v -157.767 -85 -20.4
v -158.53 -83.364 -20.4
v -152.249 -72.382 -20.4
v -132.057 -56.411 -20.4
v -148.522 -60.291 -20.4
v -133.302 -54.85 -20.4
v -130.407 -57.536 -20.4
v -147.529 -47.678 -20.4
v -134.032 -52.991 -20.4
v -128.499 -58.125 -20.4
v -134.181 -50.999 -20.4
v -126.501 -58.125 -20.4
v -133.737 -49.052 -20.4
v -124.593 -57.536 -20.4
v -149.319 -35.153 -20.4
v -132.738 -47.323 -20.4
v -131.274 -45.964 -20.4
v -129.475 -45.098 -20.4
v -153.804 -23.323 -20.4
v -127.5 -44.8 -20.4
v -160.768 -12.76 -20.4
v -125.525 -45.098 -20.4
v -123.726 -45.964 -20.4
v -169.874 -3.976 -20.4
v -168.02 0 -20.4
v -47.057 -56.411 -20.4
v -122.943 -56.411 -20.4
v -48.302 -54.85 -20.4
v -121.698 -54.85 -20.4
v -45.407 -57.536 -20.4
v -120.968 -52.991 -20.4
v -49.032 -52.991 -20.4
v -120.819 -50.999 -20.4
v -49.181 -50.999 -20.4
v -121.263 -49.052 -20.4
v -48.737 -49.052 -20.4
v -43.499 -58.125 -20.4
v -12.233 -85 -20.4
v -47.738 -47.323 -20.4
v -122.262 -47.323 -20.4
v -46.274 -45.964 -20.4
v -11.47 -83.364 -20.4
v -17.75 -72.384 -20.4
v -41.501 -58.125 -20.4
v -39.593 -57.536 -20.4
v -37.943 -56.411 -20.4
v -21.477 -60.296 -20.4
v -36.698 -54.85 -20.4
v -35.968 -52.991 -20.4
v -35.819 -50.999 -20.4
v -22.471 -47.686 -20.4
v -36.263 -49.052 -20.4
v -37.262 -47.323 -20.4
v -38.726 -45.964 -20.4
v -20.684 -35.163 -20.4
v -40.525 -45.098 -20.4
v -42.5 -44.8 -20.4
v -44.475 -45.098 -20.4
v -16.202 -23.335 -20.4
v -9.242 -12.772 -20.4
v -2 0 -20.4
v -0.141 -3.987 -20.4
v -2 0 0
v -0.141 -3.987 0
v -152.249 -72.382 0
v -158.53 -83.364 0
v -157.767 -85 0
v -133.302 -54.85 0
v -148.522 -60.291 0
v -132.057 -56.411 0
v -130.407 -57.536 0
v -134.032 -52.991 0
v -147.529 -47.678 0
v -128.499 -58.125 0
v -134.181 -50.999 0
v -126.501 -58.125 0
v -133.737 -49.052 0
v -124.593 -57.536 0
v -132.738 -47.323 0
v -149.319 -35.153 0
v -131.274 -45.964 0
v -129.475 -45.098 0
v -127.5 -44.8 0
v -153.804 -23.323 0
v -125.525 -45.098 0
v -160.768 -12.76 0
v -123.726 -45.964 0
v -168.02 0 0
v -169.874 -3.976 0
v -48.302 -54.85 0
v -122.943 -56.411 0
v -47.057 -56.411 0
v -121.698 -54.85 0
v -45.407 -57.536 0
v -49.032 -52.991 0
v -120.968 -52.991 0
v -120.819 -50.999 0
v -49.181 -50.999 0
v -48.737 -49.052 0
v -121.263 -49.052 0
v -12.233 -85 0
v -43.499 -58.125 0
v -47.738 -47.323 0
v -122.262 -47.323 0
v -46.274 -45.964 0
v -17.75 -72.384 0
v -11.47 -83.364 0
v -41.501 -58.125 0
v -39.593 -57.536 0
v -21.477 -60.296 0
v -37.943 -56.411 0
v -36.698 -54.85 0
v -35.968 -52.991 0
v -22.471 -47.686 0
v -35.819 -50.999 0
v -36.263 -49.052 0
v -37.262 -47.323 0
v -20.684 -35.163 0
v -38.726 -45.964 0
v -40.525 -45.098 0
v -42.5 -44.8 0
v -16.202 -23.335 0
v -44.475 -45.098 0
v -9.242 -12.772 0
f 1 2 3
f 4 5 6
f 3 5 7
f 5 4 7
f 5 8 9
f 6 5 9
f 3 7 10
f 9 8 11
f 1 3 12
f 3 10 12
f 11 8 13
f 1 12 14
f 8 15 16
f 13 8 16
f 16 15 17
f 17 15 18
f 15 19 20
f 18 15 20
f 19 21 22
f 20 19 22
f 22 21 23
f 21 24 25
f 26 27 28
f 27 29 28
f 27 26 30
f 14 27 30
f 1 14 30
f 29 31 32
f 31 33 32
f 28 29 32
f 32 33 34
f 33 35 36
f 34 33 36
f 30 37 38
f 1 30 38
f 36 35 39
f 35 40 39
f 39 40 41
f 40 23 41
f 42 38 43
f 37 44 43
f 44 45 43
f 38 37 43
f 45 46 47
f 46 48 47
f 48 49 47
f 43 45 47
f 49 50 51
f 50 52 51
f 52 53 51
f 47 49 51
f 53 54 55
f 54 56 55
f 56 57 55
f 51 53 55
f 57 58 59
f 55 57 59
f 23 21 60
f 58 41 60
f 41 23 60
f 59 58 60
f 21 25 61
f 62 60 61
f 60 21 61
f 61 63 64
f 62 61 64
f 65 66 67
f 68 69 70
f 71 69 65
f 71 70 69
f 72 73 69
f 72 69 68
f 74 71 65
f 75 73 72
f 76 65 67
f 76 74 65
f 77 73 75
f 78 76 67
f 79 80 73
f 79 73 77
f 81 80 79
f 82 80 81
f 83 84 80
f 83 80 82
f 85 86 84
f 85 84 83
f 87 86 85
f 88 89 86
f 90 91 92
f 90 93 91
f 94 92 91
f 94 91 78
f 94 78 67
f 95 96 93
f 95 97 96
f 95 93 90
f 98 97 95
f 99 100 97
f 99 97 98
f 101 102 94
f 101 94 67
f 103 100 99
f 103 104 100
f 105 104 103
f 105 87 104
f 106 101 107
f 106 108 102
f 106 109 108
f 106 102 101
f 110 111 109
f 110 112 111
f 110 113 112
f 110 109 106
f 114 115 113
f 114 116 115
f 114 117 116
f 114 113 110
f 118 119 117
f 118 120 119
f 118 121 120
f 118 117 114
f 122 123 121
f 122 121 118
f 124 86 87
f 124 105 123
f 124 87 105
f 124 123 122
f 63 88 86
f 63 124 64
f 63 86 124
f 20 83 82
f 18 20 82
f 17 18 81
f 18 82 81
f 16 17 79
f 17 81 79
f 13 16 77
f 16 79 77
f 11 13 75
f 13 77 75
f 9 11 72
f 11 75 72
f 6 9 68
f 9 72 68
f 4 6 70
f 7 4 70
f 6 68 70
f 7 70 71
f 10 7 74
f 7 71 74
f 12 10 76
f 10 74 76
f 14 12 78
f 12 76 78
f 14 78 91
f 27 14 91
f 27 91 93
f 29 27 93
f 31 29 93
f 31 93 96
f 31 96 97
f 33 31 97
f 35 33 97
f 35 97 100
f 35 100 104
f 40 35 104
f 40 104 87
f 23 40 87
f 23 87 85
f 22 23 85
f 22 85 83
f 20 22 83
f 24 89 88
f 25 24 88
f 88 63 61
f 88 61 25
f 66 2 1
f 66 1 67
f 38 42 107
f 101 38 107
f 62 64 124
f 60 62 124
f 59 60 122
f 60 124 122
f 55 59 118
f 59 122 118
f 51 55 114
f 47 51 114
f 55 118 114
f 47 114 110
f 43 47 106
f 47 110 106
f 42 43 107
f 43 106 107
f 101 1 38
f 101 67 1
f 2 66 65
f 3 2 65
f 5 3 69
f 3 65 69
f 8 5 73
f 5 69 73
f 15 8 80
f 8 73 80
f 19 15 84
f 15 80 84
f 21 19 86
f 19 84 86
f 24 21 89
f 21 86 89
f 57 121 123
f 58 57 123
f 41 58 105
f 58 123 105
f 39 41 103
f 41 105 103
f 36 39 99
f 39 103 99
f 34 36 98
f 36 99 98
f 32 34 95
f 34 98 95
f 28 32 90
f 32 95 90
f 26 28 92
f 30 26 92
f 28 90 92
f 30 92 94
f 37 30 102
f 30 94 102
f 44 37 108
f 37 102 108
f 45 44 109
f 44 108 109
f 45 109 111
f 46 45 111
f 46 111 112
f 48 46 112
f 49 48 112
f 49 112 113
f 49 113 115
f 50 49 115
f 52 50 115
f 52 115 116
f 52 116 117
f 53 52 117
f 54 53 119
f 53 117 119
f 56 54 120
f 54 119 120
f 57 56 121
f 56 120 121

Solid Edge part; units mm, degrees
sketch "Sketch1" plane through (0, 0, 0) normal (0, 0, 1) x (1, 0, 0)
  line L0 (0, 0) -> (-170.02, 0)
  line L1 (-170.02, 0) -> (-170.02, -85)
  line L2 (-170.02, -85) -> (0, -85)
  line L3 (0, -85) -> (0, 0)
extrude "Protrusion1" add sketch "Sketch1" against normal blind 20.4
sketch "Sketch2" plane through (-85.01, -42.5, 0) normal (0, 0, 1) x (0, 1, 0)
  circle A0 centre (-9, 42.49) radius 6.7
  circle A1 centre (-9, -42.51) radius 6.7
  circle A2 centre (-7, -120.01) radius 57.5
  circle A3 centre (-7, 119.99) radius 57.5
extrude "ExtrudedCutout_1" cut sketch "Sketch2" against normal blind 20.5
chamfer "Chamfer_2" distance 2 angle 65 1 edges at (-10.2327, -85, -10.2) measured on face at (-136.3402, -85, -16.796)
chamfer "Chamfer_3" distance 2 angle 65 1 edges at (-159.7673, -85, -10.2) measured on face at (-136.6535, -85, -16.796)
chamfer "Chamfer_4" distance 2 angle 65 1 edges at (-170.02, 0, -10.2) measured on face at (-26.6365, 0, -16.796)
chamfer "Chamfer_5" distance 2 angle 65 1 edges at (0, 0, -10.2) measured on face at (-26.3231, 0, -16.796)
